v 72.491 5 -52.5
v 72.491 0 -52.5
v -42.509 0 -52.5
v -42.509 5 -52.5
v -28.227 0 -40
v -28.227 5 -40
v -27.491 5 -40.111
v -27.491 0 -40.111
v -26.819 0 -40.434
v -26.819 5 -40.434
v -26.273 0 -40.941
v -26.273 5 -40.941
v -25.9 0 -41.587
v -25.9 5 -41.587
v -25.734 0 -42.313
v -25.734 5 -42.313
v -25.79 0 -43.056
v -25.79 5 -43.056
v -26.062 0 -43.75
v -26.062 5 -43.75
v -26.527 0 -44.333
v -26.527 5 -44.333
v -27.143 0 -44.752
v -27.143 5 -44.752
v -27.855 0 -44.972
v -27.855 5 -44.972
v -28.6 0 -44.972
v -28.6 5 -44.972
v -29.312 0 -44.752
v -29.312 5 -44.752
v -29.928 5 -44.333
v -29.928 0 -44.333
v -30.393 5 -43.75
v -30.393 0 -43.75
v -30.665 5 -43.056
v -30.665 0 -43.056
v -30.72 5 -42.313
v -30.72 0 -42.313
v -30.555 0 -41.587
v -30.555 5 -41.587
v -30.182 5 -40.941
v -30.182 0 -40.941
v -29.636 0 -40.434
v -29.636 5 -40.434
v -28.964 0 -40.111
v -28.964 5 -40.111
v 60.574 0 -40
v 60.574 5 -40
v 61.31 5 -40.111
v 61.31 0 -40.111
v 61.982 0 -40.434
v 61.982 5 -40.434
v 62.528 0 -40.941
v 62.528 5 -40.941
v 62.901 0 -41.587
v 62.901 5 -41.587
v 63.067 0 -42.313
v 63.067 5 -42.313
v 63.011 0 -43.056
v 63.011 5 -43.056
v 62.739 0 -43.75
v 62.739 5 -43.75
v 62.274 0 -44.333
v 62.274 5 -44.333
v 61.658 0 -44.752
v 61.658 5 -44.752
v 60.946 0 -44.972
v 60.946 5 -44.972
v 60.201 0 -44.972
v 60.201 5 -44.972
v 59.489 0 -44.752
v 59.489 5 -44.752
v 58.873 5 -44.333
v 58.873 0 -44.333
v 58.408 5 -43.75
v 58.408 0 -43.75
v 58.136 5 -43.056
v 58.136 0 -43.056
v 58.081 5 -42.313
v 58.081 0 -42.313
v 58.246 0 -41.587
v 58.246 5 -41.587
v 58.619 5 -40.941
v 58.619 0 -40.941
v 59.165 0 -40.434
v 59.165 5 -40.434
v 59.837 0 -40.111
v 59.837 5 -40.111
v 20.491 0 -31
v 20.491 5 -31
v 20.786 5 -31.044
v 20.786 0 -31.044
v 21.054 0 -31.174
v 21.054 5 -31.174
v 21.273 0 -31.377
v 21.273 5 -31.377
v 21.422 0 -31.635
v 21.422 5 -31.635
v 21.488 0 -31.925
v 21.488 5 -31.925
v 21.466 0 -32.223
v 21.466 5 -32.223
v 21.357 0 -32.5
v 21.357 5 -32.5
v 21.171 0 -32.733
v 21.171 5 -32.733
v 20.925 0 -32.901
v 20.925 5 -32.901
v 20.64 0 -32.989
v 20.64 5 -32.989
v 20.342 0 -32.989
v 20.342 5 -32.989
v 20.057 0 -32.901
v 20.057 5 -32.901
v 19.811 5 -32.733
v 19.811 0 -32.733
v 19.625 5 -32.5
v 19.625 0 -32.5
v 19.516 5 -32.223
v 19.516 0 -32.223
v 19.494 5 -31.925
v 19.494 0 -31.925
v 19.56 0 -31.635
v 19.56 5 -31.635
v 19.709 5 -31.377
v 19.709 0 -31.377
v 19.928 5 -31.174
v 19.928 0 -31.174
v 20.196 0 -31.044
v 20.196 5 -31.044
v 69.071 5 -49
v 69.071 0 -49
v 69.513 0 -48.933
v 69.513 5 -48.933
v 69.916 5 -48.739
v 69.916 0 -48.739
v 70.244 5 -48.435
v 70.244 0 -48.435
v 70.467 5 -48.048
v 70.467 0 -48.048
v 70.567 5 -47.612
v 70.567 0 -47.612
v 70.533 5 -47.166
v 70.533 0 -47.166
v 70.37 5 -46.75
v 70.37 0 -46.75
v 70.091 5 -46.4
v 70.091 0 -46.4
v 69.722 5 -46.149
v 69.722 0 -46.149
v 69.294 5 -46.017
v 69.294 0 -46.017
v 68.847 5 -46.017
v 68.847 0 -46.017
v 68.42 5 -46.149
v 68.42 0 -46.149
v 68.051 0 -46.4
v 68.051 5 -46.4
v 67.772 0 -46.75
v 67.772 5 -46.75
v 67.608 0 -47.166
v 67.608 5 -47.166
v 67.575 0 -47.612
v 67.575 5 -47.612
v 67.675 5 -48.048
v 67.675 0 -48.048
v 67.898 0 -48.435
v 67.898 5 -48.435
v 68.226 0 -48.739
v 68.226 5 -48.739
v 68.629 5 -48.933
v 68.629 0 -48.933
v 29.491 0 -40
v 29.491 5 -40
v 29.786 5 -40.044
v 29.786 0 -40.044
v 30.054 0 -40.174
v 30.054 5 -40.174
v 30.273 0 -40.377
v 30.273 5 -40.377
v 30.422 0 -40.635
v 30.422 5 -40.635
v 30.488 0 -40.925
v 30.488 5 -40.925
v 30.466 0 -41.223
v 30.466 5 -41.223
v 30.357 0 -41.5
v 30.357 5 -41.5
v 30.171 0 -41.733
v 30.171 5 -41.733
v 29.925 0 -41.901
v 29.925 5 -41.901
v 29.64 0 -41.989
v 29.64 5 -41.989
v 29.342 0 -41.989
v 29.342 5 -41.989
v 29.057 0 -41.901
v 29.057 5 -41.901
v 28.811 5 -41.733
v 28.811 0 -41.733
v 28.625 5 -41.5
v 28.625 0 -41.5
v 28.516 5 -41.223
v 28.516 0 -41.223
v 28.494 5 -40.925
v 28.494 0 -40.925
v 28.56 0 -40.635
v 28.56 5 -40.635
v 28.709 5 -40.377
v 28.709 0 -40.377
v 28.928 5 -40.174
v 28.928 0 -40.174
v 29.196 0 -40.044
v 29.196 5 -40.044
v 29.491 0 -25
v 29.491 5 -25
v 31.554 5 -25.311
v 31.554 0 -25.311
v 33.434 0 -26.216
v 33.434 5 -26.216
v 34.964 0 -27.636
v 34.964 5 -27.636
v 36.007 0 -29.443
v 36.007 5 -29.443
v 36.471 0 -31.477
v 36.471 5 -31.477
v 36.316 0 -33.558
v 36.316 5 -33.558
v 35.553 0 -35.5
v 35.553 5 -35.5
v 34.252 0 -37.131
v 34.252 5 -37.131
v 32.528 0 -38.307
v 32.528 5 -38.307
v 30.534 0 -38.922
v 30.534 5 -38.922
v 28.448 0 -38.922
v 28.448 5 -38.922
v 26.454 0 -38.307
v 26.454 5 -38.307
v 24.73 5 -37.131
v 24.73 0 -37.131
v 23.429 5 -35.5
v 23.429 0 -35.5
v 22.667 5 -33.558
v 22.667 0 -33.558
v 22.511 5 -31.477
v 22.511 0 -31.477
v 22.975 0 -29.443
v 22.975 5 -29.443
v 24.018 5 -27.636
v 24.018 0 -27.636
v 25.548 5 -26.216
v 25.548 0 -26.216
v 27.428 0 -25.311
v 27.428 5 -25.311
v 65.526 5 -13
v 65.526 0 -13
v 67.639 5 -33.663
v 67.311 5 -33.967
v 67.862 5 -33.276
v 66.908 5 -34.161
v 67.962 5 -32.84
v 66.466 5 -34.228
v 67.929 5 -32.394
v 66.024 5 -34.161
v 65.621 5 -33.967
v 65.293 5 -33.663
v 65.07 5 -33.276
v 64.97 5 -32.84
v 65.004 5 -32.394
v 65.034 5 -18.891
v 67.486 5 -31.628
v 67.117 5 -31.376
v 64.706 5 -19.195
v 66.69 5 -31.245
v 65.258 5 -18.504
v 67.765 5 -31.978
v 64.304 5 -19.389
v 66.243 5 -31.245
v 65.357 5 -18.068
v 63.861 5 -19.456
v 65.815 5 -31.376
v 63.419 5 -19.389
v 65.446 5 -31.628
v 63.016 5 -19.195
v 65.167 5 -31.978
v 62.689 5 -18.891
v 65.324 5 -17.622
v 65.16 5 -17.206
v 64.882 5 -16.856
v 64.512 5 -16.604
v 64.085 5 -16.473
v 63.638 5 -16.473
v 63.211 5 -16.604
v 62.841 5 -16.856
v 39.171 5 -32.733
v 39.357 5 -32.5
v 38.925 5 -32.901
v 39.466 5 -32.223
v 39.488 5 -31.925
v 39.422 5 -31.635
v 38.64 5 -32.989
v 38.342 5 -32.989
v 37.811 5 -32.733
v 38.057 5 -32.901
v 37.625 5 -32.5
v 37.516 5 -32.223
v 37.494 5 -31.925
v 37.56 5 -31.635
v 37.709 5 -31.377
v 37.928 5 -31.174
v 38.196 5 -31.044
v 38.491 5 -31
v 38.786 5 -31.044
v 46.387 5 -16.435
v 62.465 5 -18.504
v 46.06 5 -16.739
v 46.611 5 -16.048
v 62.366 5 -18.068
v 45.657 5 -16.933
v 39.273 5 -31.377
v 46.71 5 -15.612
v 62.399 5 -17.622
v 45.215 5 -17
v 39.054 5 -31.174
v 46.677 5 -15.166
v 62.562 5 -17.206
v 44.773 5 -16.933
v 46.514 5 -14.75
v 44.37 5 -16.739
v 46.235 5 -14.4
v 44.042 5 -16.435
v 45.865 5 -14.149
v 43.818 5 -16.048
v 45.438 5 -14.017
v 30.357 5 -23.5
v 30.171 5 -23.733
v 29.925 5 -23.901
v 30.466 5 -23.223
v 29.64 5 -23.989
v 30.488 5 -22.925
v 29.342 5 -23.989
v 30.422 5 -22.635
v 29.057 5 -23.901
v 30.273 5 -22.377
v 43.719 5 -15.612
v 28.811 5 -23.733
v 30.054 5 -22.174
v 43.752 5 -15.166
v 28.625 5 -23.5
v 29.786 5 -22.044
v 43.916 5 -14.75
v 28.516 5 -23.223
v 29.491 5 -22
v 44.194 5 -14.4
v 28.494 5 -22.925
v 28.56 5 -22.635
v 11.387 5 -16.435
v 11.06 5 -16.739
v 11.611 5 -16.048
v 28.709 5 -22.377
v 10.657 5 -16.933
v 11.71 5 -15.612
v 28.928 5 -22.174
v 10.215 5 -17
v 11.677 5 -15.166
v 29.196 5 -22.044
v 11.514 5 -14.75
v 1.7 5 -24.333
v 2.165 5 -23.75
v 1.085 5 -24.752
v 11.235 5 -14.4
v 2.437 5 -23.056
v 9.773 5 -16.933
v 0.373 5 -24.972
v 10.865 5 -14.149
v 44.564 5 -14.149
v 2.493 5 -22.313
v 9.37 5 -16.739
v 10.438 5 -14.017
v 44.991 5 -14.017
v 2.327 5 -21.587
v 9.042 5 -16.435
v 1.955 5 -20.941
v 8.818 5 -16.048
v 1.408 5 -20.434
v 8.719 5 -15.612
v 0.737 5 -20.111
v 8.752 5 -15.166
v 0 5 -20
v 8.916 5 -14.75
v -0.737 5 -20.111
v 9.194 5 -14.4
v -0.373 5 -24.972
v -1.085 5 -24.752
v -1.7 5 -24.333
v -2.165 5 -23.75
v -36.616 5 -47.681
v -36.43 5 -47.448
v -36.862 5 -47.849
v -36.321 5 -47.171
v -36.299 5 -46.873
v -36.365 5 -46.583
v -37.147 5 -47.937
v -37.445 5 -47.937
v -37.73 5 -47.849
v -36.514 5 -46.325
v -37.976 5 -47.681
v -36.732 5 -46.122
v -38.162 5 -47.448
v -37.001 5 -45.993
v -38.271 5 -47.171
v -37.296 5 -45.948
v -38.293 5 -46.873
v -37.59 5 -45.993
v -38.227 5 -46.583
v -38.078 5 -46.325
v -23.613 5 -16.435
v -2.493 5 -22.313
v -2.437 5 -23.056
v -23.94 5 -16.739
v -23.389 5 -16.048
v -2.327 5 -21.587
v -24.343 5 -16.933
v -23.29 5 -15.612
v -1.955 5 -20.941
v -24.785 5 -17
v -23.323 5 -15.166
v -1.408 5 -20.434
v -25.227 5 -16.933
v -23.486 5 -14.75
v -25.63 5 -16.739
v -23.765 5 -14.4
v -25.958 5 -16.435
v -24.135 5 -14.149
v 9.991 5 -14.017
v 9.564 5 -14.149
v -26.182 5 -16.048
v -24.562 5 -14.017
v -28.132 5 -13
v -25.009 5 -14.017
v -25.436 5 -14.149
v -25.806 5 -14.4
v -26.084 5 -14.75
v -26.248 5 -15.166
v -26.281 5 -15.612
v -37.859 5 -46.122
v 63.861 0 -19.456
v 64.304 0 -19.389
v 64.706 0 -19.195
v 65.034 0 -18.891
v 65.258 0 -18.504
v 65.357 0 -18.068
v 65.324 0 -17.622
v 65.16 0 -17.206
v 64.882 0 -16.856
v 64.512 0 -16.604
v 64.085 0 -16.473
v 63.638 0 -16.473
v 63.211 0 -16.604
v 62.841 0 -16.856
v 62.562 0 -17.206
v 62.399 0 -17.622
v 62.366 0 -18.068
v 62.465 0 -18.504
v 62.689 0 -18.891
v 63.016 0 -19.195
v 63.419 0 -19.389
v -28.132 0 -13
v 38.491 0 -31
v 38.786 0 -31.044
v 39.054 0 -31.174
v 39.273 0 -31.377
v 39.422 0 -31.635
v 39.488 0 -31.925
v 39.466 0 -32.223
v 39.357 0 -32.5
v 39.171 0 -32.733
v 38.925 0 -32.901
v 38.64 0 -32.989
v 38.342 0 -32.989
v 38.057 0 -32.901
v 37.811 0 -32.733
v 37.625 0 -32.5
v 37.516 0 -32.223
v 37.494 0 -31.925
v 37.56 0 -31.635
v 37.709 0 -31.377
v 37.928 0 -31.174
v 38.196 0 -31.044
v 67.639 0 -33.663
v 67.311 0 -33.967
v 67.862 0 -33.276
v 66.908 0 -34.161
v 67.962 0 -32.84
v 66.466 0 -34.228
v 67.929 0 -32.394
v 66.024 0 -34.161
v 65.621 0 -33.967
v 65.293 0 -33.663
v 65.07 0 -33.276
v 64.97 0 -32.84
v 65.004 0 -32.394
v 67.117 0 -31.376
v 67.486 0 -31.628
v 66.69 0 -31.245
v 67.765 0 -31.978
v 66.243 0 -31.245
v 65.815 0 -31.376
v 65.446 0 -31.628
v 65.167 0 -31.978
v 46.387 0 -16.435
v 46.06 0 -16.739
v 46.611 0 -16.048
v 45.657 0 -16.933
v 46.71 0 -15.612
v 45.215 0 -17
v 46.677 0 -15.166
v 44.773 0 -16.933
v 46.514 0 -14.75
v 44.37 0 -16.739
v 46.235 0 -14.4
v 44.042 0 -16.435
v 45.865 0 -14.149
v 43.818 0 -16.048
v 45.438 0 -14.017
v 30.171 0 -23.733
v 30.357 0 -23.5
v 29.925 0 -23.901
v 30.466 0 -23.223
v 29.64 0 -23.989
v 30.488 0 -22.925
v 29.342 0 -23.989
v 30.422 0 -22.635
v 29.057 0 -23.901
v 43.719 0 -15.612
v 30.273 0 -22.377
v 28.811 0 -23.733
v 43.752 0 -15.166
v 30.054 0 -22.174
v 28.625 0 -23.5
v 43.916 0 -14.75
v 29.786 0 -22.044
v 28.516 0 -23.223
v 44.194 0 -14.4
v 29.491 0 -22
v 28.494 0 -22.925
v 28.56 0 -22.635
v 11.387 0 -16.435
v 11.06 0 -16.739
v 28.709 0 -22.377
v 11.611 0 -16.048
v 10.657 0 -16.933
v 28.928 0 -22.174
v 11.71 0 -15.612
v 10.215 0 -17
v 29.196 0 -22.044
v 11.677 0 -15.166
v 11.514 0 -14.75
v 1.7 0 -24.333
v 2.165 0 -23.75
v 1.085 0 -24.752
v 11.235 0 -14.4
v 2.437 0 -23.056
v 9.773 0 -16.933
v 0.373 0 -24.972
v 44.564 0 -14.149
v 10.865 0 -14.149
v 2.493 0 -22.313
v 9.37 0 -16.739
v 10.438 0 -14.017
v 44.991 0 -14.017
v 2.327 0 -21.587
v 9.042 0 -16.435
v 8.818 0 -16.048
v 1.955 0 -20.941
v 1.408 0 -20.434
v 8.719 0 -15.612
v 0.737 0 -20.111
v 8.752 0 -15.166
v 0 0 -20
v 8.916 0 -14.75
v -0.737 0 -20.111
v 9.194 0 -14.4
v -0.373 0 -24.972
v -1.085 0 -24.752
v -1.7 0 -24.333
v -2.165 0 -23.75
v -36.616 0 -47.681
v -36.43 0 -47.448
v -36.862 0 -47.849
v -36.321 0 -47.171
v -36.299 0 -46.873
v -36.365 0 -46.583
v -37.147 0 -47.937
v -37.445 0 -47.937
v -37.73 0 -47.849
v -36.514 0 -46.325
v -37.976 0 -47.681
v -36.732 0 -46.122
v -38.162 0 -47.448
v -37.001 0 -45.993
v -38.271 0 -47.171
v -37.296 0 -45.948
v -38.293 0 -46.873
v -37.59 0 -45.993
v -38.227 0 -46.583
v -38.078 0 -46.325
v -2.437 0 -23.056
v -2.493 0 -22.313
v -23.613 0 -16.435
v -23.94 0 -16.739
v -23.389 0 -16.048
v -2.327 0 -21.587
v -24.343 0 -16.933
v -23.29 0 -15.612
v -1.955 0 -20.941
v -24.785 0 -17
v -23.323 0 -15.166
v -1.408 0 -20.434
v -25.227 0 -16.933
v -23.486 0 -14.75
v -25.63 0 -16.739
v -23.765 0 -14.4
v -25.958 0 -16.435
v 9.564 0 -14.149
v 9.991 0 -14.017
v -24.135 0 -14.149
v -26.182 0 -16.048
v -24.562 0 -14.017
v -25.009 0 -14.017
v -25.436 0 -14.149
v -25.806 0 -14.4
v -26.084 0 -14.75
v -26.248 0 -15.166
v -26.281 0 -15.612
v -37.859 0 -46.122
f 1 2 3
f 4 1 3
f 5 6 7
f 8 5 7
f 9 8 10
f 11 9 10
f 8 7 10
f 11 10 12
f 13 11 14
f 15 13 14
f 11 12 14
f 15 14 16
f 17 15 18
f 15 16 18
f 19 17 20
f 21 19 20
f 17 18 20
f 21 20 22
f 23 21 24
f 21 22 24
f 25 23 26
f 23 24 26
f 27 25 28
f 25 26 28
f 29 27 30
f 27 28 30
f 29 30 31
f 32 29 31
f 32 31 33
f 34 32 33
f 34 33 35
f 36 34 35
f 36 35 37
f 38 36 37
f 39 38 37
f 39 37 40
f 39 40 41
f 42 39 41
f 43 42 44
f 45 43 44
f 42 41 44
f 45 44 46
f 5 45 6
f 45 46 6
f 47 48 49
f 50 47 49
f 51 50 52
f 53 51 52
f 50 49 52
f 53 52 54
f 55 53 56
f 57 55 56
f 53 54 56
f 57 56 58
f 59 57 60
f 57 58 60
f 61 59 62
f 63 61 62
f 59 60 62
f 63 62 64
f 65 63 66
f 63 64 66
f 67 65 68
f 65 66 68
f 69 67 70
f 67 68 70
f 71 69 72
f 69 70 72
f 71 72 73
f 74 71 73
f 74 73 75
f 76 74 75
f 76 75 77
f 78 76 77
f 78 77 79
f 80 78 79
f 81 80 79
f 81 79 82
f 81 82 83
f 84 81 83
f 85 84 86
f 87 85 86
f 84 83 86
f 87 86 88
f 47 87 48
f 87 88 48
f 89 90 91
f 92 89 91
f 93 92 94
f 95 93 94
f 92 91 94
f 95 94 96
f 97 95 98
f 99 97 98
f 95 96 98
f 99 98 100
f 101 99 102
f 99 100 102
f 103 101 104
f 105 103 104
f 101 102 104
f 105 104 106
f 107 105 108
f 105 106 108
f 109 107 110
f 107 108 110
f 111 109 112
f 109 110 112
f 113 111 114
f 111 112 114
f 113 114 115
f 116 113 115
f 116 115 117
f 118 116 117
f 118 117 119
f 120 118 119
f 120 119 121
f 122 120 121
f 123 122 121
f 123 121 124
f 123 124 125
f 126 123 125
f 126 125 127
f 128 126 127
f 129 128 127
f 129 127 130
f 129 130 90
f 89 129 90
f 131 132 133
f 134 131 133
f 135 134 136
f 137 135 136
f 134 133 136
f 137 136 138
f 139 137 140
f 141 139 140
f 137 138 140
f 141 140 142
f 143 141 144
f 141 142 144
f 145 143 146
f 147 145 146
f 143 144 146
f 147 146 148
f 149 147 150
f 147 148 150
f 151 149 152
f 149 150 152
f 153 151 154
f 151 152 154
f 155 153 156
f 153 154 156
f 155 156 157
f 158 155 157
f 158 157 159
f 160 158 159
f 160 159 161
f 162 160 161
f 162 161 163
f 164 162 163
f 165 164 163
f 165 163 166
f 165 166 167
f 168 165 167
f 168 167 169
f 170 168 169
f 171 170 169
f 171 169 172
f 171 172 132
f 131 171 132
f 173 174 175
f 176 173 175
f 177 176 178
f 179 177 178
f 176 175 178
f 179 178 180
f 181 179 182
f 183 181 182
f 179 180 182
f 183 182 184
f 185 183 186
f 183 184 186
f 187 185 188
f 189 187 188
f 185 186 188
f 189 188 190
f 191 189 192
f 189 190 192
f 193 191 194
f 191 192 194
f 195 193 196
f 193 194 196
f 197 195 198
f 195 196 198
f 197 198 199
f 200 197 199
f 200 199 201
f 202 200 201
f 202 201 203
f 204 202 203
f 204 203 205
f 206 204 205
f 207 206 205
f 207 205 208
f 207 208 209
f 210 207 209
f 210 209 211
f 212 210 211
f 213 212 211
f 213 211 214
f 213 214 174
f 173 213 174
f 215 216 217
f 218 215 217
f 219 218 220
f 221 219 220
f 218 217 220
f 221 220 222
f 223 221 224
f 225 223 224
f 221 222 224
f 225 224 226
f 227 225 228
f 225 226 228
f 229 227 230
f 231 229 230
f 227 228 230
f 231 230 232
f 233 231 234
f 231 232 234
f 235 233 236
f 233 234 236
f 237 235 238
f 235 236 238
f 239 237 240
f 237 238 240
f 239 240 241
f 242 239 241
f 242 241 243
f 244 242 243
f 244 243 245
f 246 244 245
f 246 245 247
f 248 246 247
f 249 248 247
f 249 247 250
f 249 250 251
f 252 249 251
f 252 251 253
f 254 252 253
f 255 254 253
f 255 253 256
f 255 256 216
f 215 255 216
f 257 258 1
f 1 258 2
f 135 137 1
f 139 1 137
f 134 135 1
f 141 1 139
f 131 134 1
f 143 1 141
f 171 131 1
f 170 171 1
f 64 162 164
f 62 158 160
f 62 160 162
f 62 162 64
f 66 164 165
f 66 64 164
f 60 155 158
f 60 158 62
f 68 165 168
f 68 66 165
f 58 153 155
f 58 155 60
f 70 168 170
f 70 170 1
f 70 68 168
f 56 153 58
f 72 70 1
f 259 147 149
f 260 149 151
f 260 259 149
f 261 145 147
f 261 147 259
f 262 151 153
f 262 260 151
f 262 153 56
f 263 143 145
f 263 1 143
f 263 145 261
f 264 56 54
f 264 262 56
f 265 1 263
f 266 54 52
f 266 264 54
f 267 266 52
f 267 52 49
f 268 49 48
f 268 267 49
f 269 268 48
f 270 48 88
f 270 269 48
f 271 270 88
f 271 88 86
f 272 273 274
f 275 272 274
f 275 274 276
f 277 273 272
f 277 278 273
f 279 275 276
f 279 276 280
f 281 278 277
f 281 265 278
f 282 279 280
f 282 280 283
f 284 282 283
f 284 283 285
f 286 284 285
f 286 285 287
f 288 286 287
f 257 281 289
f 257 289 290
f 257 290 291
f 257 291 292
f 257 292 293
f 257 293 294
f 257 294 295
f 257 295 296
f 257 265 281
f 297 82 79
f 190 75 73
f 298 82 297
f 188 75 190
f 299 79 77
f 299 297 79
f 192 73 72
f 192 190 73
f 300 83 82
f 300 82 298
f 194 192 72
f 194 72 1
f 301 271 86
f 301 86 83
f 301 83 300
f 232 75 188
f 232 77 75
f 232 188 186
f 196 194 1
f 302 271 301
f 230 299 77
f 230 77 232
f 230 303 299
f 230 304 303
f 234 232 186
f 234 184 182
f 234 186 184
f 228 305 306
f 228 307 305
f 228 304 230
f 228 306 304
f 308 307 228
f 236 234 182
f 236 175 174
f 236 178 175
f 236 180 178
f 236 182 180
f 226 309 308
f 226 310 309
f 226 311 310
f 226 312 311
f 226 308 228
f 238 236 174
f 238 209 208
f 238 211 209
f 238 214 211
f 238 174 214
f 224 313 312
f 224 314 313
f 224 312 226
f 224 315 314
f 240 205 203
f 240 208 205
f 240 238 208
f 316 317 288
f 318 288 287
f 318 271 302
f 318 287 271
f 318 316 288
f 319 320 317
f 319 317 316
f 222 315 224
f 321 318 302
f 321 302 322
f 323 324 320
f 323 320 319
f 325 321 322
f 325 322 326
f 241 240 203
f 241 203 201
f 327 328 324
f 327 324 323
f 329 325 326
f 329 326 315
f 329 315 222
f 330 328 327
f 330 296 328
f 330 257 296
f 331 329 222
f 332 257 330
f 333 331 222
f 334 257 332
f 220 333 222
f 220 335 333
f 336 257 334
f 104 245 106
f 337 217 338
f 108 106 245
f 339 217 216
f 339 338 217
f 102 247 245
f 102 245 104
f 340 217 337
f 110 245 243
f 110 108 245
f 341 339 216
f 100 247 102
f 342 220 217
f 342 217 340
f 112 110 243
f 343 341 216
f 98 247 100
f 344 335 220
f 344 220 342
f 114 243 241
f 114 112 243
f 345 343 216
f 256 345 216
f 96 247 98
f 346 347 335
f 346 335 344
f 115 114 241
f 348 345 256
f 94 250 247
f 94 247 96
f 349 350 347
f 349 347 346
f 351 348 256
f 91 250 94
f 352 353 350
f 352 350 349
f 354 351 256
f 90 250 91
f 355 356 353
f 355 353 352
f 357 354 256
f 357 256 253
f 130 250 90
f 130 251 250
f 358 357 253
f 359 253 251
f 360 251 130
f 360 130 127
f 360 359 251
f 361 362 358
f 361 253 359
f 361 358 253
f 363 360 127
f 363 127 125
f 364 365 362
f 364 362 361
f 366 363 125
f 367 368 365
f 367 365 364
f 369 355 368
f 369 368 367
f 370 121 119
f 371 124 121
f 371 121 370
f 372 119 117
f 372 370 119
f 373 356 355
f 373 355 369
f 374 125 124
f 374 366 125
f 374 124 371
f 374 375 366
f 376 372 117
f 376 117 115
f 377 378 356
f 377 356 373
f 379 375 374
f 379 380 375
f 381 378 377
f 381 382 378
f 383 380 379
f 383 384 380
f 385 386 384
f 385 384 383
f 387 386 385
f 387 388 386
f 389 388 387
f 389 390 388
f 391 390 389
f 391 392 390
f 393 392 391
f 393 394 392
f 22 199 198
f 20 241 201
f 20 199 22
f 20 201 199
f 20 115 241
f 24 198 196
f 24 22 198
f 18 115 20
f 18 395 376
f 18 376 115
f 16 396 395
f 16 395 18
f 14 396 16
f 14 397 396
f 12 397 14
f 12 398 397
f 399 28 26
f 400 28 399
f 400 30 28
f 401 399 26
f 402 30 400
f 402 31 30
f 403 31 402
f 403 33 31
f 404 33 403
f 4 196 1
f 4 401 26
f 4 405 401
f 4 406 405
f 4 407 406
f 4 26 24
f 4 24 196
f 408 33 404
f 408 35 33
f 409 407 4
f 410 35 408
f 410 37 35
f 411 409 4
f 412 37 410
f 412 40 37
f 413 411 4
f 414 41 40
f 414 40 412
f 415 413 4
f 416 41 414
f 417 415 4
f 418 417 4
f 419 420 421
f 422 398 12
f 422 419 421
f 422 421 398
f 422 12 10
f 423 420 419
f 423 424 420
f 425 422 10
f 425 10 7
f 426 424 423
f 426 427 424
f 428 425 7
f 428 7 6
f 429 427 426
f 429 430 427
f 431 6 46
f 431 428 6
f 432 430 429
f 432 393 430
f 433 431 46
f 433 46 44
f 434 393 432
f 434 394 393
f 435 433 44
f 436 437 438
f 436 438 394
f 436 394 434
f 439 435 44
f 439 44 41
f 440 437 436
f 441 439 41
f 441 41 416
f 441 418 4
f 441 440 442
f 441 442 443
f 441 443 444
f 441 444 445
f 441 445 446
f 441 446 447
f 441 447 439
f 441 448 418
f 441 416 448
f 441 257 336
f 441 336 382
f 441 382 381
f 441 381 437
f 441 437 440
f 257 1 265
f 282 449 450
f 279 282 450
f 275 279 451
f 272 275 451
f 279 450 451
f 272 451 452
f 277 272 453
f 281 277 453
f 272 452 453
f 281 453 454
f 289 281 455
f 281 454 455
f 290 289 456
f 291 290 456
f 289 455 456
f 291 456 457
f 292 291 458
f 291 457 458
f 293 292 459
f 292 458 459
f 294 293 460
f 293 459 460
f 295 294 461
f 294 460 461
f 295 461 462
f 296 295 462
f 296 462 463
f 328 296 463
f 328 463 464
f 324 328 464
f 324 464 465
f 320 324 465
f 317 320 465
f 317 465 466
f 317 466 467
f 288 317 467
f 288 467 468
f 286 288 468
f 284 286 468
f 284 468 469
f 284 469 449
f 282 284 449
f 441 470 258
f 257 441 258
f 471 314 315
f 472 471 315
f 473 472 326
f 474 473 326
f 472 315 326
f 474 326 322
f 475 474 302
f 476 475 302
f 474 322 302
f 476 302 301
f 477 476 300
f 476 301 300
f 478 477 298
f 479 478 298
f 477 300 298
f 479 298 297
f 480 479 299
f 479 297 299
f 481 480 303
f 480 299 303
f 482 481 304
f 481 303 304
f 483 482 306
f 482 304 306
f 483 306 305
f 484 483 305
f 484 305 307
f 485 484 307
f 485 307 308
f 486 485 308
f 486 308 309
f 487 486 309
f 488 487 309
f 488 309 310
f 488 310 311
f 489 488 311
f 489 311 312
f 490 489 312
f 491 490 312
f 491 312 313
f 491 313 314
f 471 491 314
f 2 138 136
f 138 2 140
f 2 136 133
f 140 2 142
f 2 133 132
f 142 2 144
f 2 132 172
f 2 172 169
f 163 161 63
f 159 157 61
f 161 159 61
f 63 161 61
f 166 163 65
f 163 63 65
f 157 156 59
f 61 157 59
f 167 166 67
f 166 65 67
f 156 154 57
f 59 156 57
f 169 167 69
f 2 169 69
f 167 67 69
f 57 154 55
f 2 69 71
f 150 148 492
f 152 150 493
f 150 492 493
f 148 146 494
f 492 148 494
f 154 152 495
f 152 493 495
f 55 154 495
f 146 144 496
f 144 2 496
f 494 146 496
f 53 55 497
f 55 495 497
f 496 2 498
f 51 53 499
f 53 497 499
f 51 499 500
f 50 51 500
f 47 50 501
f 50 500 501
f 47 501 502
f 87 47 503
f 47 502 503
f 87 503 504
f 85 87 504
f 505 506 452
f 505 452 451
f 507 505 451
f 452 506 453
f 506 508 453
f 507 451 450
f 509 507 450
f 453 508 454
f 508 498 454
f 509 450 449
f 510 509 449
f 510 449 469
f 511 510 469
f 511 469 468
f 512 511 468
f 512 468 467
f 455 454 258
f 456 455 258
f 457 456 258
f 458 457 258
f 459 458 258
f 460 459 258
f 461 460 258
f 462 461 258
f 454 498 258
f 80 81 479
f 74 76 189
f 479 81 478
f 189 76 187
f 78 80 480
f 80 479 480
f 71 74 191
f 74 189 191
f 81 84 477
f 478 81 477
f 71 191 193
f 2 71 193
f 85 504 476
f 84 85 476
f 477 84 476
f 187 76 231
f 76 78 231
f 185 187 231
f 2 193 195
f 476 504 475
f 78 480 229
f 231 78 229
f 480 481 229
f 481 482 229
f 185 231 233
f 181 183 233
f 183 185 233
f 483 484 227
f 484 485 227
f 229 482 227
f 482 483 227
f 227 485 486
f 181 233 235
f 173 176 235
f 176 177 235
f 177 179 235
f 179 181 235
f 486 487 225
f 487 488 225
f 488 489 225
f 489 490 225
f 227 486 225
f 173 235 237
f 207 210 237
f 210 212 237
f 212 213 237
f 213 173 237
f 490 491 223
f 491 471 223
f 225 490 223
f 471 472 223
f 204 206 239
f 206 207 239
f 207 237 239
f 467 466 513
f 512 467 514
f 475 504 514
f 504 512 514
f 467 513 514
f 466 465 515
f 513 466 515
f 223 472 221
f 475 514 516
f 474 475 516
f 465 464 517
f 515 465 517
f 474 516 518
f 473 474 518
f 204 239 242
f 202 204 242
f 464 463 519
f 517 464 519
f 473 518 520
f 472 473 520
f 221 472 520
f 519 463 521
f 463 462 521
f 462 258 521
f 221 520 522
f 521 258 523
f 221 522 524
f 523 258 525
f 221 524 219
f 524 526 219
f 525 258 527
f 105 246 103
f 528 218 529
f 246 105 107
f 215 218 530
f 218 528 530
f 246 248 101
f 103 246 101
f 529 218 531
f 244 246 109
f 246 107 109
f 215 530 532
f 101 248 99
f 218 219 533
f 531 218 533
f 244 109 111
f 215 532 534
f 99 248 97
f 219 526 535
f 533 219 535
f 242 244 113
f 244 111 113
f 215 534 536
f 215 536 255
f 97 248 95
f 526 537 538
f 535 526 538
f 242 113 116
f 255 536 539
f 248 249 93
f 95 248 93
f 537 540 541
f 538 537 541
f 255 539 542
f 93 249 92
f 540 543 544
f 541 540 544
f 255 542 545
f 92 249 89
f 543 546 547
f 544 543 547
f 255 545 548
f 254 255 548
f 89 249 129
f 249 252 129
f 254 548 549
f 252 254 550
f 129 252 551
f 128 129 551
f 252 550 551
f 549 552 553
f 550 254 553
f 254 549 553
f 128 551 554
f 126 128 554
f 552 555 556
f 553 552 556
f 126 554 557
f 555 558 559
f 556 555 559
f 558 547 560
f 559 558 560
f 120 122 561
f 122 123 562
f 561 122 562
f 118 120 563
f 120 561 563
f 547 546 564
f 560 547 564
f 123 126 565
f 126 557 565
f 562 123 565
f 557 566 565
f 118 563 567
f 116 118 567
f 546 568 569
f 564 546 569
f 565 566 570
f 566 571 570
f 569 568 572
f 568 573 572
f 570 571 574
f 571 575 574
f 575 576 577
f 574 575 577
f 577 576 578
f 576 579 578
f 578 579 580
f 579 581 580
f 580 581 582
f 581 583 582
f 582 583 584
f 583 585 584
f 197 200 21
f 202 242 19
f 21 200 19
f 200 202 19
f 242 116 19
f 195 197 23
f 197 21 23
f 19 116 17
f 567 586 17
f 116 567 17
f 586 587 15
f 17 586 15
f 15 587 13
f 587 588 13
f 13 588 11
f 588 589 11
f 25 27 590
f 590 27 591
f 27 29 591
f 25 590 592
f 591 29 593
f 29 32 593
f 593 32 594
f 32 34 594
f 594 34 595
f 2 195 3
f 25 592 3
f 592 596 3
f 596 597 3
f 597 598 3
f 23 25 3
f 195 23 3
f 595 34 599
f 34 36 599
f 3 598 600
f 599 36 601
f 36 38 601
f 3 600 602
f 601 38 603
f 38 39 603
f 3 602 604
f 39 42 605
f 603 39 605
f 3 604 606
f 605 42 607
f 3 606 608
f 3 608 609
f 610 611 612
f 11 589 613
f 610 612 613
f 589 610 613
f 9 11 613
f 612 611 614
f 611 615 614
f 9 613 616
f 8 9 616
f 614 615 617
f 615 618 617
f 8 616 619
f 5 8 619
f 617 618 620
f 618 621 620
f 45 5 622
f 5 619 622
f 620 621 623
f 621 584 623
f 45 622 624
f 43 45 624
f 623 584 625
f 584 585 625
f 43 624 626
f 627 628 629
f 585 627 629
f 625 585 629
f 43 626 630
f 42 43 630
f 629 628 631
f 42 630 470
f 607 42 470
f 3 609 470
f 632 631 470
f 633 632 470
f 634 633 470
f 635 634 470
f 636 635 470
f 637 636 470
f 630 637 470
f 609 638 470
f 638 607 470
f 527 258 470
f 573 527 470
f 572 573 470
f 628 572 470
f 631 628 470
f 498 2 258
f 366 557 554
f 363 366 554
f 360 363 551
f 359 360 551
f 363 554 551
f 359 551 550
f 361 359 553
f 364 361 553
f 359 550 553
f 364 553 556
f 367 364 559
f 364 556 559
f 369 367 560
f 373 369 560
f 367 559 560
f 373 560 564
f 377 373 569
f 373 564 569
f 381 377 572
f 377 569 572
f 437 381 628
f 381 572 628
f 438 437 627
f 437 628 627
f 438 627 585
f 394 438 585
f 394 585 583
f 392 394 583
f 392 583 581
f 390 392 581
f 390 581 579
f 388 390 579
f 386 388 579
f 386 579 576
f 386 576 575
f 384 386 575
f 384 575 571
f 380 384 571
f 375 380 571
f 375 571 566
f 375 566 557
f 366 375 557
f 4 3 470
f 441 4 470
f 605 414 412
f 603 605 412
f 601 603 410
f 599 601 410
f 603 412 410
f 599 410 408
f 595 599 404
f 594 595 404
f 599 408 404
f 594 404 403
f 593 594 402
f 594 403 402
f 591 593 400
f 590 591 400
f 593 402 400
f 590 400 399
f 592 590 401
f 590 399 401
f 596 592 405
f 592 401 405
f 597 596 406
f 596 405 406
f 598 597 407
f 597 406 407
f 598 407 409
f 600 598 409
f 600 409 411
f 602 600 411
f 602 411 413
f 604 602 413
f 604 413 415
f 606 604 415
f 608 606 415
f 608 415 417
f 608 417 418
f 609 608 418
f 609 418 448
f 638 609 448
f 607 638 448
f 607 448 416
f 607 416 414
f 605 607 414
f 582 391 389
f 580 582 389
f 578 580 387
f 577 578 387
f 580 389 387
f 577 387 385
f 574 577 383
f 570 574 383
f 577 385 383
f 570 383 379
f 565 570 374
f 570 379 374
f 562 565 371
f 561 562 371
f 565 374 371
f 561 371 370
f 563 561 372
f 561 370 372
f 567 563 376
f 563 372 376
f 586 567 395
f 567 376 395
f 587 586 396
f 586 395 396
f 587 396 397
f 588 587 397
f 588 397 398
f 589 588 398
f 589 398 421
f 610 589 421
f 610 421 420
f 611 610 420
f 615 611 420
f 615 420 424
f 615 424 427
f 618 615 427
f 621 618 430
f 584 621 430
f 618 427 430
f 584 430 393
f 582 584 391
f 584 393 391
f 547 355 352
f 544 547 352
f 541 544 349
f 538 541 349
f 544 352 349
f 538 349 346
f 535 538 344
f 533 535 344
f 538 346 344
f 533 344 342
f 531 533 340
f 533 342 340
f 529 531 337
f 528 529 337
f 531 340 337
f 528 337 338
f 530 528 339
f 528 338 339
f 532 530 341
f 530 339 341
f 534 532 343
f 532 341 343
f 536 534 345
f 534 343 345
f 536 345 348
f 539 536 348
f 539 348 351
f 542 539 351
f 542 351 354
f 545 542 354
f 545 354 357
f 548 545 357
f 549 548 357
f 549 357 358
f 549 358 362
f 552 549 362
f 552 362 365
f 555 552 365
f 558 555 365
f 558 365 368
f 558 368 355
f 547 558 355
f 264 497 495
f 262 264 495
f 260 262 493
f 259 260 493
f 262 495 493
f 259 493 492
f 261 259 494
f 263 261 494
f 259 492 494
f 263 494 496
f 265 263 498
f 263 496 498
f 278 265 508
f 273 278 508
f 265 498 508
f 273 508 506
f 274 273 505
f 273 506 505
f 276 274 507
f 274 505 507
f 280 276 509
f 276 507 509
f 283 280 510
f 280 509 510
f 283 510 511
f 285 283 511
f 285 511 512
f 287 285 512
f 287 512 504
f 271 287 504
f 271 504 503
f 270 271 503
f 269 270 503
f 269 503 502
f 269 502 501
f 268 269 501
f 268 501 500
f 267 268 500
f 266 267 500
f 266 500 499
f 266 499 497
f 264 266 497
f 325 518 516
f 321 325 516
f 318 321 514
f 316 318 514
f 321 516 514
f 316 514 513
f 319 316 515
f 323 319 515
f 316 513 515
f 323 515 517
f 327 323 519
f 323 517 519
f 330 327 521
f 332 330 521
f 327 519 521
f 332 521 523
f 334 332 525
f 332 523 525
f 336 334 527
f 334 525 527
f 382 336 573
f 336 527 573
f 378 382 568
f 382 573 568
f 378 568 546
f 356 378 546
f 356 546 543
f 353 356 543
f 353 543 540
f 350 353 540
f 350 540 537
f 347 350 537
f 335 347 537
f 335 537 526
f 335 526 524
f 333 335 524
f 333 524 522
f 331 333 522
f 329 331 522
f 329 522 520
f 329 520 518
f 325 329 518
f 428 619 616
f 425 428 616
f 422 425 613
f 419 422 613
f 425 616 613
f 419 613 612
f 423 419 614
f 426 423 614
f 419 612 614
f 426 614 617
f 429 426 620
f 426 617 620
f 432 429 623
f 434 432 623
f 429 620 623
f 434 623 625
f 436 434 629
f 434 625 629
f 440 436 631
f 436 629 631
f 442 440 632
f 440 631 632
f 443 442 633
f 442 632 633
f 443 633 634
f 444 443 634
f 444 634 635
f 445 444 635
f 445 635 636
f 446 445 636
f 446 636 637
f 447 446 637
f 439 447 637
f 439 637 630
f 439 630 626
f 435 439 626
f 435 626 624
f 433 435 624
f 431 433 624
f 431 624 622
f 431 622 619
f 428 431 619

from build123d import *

# Parameters (mm, degrees)
BOSS_EXTRUDE2_DEPTH = 5
SKETCH2_R           = 2.5
CUT_EXTRUDE1_DEPTH  = 5
SKETCH3_R           = 7
SKETCH3_R_2         = 1
CUT_EXTRUDE2_DEPTH  = 90.644870735
SKETCH4_R           = 1.5
CUT_EXTRUDE3_DEPTH  = 90.644870735
SKETCH5_R           = 1
CUT_EXTRUDE4_DEPTH  = 90.644870735


with BuildPart() as part:
    # Sketch1 → Boss-Extrude2 (new body)
    with BuildSketch(Plane(origin=(0, 0, 0), x_dir=(-1, 0, 0), z_dir=(0, 1, 0))):
        Polygon((-72.491053579, -52.5), (42.508946421, -52.5), (28.132122167, -13), (-65.526137841, -13), align=None)
    extrude(amount=BOSS_EXTRUDE2_DEPTH)

    # Sketch2 → Cut-Extrude1 (cut)
    with BuildSketch(Plane(origin=(0, 5, 0), x_dir=(-1, 0, 0), z_dir=(0, 1, 0))):
        with Locations(Location((28.227466353, -42.5, 0), (0, 0, 90))):
            Circle(SKETCH2_R)
        with Locations(Location((0, -22.5, 0), (0, 0, 90))):
            Circle(SKETCH2_R)
        with Locations(Location((-60.573517653, -42.5, 0), (0, 0, 90))):
            Circle(SKETCH2_R)
    extrude(amount=-CUT_EXTRUDE1_DEPTH, mode=Mode.SUBTRACT)

    # Sketch3 → Cut-Extrude2 (cut, through all)
    with BuildSketch(Plane(origin=(0, 5, 0), x_dir=(1, 0, 0), z_dir=(0, 1, 0))):
        with Locations(Location((29.491053579, 32, 0), (0, 0, 270))):
            Circle(SKETCH3_R)
        with Locations(Location((20.491053579, 32, 0), (0, 0, 270))):
            Circle(SKETCH3_R_2)
        with Locations(Location((29.491053579, 41, 0), (0, 0, 270))):
            Circle(SKETCH3_R_2)
        with Locations(Location((38.491053579, 32, 0), (0, 0, 270))):
            Circle(SKETCH3_R_2)
        with Locations(Location((29.491053579, 23, 0), (0, 0, 270))):
            Circle(SKETCH3_R_2)
    extrude(amount=-CUT_EXTRUDE2_DEPTH, mode=Mode.SUBTRACT)

    # Sketch4 → Cut-Extrude3 (cut, through all)
    with BuildSketch(Plane.XZ):
        with Locations(Location((-24.785336663, -15.5, 0), (0, 0, 270))):
            Circle(SKETCH4_R)
        with Locations(Location((10.214663337, -15.5, 0), (0, 0, 270))):
            Circle(SKETCH4_R)
        with Locations(Location((45.214663337, -15.5, 0), (0, 0, 270))):
            Circle(SKETCH4_R)
        with Locations(Location((63.861406816, -17.95576741, 0), (0, 0, 270))):
            Circle(SKETCH4_R)
        with Locations(Location((66.466129481, -32.727883705, 0), (0, 0, 270))):
            Circle(SKETCH4_R)
        with Locations(Location((69.070852146, -47.5, 0), (0, 0, 270))):
            Circle(SKETCH4_R)
    extrude(amount=-CUT_EXTRUDE3_DEPTH, mode=Mode.SUBTRACT)

    # Sketch5 → Cut-Extrude4 (cut, through all)
    with BuildSketch(Plane(origin=(0, 5, 0), x_dir=(-1, 0, 0), z_dir=(0, 1, 0))):
        with Locations(Location((37.295727555, -46.948212084, 0), (0, 0, 90))):
            Circle(SKETCH5_R)
    extrude(amount=-CUT_EXTRUDE4_DEPTH, mode=Mode.SUBTRACT)


solid = part.part
